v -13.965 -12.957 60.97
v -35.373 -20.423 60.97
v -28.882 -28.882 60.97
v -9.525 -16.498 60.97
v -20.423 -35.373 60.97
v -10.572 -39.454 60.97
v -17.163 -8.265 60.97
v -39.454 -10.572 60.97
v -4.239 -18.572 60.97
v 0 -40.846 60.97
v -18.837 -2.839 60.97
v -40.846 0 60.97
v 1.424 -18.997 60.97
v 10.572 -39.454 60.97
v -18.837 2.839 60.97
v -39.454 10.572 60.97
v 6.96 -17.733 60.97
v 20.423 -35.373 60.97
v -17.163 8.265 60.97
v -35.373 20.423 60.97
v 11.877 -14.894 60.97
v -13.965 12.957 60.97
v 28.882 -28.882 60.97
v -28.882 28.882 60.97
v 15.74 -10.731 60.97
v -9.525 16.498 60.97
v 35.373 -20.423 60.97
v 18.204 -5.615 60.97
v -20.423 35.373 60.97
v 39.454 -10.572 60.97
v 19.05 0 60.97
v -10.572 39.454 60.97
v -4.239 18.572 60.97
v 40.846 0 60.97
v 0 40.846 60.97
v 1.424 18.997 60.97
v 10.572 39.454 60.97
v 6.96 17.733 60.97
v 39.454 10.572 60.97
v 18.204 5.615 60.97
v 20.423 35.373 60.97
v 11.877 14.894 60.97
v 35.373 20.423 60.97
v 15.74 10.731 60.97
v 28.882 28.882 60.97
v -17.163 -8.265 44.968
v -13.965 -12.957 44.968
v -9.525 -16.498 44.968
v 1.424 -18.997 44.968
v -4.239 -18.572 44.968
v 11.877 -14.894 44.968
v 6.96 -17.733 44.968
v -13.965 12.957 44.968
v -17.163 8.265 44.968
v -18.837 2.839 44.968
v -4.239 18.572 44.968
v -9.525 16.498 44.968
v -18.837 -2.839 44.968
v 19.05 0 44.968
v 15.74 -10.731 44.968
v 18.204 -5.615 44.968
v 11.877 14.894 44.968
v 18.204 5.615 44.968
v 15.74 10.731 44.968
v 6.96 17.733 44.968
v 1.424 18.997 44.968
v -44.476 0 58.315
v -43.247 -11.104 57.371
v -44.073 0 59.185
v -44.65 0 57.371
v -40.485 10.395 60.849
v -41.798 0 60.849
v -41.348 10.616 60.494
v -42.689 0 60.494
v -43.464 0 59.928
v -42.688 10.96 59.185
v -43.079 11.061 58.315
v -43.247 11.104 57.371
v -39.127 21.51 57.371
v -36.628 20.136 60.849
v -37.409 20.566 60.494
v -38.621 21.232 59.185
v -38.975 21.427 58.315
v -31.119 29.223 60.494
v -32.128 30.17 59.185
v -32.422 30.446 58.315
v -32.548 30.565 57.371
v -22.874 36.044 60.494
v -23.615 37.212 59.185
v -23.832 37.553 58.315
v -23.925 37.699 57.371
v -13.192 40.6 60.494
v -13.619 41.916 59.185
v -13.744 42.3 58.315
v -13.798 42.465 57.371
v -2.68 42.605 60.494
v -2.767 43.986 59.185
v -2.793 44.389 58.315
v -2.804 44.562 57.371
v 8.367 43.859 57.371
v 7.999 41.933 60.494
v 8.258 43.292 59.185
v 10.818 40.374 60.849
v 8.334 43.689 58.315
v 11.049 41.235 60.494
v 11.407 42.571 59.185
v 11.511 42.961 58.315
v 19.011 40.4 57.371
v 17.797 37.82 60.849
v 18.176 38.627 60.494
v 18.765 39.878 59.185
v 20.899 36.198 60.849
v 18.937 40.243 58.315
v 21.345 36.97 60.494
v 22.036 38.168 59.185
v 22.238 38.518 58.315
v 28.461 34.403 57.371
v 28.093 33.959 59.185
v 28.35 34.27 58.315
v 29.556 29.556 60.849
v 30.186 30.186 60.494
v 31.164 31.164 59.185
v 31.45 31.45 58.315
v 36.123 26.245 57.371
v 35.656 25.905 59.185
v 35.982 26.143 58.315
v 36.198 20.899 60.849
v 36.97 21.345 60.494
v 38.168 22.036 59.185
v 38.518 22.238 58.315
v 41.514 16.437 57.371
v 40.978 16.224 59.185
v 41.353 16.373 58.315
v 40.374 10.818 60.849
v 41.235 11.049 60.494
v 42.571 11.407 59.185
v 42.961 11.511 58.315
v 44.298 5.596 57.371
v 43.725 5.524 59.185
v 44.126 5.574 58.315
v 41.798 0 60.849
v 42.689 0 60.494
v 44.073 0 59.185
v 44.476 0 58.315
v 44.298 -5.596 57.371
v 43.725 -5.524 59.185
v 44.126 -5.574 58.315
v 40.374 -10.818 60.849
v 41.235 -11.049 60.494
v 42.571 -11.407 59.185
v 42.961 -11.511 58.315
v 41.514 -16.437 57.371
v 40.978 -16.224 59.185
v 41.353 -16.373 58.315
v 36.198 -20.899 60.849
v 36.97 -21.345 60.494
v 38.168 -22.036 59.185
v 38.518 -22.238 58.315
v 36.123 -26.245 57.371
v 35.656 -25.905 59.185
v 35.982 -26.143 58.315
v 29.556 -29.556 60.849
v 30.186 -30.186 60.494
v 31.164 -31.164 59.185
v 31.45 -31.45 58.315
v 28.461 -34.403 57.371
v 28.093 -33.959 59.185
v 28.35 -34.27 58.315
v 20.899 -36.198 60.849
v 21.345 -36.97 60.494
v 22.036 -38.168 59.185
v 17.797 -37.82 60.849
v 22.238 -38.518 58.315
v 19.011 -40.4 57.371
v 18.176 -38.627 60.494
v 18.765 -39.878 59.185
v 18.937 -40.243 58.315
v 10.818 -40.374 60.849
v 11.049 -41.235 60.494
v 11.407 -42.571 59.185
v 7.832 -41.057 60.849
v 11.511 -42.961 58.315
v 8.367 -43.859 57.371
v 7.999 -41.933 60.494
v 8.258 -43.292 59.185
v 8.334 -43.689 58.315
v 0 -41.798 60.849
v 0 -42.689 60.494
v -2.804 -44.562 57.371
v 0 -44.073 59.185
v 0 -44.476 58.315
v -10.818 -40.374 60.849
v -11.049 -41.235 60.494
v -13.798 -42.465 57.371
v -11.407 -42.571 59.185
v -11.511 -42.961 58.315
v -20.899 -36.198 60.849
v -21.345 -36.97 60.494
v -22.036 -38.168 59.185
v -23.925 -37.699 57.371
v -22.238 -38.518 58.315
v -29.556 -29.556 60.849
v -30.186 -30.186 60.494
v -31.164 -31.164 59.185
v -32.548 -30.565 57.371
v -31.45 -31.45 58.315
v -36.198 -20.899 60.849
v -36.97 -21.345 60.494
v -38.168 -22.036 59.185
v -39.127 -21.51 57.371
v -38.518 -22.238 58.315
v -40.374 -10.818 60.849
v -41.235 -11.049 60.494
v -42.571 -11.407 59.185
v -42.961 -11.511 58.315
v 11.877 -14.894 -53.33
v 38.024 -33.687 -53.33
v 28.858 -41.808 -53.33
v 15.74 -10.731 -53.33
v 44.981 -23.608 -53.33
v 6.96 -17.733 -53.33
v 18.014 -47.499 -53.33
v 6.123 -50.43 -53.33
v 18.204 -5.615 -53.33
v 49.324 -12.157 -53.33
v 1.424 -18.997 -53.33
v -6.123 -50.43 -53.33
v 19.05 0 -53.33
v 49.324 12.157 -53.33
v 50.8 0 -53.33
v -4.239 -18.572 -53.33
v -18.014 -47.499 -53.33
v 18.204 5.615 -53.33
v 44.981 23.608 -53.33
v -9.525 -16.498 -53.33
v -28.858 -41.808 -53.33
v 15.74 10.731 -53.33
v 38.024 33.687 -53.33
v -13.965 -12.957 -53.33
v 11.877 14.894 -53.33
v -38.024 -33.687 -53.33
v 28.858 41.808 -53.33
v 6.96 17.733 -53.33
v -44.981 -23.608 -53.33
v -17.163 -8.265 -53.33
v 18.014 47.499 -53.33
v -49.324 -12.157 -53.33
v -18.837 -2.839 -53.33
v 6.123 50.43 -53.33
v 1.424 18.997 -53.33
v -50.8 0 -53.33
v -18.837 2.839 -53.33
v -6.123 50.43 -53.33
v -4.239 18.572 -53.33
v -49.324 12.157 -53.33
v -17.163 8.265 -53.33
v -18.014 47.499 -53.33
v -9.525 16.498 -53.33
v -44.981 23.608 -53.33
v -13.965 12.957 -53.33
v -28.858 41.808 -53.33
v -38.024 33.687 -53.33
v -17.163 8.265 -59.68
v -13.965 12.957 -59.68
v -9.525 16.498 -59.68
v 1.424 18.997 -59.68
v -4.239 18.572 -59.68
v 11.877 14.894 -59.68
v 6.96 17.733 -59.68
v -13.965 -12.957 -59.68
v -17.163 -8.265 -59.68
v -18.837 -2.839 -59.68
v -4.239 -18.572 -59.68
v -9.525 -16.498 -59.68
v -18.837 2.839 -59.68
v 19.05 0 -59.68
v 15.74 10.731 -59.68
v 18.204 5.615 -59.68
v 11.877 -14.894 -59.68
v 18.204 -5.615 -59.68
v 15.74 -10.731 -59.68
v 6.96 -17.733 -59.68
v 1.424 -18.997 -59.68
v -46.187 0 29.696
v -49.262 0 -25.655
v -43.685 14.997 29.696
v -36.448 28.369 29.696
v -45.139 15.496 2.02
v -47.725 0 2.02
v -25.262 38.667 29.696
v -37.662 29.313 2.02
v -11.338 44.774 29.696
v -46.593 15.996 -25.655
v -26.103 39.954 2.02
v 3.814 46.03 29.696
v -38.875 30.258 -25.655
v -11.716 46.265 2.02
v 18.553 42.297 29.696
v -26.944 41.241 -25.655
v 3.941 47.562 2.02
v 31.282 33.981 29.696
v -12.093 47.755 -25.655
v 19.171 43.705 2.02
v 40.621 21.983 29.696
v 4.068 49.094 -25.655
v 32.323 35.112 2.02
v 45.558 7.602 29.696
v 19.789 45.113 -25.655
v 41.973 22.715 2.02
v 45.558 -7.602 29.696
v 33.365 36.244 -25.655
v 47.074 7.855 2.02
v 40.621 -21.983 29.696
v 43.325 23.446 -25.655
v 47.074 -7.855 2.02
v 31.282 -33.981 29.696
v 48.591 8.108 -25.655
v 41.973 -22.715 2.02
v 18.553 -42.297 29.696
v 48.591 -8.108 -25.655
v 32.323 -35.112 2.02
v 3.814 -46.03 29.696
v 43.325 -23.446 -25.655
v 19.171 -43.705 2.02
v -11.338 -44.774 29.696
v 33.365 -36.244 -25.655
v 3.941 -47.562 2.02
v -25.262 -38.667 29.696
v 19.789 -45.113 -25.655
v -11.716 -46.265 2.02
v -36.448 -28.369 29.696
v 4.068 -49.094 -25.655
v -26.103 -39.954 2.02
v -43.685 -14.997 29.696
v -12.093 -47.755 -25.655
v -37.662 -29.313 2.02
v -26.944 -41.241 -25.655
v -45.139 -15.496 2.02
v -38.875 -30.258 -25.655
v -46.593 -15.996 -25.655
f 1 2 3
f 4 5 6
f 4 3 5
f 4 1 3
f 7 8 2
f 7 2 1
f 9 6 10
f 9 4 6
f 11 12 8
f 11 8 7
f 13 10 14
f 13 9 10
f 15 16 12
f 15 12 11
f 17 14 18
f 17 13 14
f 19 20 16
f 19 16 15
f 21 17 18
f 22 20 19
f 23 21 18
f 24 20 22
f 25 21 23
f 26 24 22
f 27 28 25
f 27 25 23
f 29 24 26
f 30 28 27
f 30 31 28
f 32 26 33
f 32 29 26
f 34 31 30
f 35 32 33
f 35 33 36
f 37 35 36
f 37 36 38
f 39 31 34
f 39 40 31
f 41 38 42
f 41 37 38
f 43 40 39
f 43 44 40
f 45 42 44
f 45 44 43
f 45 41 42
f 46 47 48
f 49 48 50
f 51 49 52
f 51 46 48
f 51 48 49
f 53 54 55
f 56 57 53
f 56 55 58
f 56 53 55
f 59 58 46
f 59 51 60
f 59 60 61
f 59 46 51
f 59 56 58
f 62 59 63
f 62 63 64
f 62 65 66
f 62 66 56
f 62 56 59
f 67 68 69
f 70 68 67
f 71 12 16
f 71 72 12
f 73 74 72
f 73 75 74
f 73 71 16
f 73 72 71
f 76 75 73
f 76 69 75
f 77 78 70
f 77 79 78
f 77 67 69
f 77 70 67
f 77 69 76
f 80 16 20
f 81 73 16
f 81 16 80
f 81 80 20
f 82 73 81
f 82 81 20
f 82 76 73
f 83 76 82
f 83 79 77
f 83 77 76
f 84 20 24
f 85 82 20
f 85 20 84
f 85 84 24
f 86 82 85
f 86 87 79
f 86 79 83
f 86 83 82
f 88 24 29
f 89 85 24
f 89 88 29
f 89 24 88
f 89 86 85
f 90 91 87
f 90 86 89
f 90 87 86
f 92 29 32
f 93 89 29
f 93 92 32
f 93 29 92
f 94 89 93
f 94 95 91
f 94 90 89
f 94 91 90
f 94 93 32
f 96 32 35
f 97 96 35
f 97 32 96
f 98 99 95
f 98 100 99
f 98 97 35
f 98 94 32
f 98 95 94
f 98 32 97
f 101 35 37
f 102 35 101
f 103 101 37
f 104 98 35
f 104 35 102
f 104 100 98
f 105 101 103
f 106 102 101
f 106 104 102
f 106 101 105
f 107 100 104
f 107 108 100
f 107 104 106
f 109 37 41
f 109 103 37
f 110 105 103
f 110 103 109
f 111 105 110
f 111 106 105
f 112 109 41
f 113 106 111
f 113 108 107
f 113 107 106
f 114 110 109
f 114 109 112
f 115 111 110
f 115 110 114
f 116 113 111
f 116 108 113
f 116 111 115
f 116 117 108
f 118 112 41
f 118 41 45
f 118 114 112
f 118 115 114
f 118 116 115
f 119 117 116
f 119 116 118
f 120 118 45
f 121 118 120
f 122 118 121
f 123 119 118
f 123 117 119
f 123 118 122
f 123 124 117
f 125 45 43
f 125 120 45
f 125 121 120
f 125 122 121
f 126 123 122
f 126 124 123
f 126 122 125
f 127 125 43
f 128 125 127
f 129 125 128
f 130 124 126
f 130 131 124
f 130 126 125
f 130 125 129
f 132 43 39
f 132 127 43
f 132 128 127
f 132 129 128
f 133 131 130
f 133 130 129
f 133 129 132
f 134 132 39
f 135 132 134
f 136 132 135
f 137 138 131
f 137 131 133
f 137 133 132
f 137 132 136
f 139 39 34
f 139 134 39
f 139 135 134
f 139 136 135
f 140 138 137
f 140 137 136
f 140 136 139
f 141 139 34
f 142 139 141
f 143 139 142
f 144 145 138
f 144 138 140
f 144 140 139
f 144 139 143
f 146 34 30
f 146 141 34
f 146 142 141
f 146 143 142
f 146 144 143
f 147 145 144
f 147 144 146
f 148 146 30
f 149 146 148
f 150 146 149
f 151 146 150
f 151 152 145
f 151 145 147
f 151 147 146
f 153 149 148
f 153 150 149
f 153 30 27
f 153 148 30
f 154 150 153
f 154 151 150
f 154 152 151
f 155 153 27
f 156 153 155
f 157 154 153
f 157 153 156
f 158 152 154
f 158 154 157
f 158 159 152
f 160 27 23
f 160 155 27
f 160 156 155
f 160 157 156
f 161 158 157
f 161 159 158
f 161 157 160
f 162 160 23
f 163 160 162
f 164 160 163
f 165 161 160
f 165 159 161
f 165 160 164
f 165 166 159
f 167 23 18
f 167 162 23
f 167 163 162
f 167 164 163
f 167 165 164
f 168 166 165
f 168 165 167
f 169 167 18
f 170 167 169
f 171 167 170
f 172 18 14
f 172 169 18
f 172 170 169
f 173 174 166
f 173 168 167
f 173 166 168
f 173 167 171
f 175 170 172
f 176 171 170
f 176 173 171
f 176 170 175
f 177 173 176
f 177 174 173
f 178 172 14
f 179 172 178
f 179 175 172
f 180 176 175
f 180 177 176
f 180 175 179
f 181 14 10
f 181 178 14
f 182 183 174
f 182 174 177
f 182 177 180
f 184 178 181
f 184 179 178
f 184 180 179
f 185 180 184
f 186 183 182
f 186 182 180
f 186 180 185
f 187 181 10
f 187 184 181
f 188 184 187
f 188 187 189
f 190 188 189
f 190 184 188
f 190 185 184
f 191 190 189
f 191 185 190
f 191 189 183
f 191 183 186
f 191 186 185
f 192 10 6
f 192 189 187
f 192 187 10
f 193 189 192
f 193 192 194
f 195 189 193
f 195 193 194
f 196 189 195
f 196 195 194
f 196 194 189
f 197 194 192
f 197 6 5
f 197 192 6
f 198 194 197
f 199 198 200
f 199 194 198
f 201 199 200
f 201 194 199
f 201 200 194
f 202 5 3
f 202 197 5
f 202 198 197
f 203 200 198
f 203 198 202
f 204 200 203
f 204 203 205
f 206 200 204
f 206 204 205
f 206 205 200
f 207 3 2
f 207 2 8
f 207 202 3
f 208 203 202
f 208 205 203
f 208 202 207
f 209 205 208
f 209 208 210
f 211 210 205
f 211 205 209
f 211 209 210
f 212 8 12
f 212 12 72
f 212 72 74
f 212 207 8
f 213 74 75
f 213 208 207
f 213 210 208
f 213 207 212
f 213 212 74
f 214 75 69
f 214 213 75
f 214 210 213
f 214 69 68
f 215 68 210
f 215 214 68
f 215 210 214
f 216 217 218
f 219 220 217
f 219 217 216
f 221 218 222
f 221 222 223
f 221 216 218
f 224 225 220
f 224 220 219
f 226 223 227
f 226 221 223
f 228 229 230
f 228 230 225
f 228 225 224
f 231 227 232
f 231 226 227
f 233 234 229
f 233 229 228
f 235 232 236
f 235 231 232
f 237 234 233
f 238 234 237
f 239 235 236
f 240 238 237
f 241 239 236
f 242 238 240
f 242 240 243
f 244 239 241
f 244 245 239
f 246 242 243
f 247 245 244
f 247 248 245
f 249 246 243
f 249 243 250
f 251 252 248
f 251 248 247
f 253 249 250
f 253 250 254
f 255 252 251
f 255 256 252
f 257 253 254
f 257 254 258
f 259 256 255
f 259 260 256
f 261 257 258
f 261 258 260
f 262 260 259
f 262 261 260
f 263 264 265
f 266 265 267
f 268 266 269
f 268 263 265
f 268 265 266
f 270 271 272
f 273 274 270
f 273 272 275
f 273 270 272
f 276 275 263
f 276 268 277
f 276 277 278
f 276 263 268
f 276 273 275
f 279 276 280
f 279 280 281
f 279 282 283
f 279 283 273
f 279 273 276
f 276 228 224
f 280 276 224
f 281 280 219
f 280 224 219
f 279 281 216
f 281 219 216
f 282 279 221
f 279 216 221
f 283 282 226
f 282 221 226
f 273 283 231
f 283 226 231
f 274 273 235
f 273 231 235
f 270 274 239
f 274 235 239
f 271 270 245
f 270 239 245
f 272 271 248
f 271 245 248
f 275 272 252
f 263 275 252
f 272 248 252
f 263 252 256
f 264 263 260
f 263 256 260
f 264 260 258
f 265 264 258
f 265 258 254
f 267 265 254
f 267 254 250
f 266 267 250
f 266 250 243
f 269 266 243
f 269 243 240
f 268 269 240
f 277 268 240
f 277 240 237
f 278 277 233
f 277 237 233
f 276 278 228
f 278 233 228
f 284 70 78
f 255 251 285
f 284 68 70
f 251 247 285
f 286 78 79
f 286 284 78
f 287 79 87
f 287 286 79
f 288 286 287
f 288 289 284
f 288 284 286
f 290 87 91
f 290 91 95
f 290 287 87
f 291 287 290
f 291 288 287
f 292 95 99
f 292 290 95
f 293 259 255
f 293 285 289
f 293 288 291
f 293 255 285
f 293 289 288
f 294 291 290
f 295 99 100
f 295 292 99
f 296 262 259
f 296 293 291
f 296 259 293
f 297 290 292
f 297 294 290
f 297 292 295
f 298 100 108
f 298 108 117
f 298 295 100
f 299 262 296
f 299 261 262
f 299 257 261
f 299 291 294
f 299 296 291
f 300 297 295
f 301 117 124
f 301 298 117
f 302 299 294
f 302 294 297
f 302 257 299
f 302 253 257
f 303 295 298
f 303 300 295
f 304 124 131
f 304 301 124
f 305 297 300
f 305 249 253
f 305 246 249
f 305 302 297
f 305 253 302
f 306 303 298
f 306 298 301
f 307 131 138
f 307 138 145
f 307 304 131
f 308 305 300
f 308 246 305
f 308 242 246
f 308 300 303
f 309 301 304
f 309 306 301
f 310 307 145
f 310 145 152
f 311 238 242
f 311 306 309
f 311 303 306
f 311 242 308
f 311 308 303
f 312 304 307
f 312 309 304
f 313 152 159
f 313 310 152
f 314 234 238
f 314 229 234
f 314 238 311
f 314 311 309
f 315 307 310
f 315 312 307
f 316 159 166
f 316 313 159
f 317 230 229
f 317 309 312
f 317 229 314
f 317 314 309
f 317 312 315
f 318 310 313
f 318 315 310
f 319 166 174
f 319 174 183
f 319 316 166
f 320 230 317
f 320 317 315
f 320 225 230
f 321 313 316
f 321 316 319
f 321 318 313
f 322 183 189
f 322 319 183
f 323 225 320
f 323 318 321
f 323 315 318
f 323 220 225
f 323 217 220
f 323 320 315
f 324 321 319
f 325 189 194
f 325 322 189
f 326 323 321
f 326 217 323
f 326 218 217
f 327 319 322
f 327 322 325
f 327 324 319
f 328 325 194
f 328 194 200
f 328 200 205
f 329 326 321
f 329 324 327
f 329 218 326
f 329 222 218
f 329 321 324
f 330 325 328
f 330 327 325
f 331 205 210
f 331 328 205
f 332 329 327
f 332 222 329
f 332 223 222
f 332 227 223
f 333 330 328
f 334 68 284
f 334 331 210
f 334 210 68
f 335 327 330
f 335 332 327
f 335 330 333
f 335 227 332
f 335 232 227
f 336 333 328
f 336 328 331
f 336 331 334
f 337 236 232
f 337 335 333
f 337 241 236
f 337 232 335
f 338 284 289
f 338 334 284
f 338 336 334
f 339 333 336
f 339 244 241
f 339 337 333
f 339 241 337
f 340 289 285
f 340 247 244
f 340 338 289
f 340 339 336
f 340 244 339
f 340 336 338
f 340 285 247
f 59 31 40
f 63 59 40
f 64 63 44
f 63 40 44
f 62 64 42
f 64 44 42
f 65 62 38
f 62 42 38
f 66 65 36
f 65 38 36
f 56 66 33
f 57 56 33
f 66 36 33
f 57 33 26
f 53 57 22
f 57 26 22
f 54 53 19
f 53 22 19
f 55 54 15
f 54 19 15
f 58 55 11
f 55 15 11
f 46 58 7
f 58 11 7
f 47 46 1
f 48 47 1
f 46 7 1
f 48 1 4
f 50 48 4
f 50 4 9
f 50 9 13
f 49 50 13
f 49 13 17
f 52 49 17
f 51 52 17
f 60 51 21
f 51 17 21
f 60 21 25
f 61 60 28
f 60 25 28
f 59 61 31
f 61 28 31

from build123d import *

# Parameters (mm, degrees)
F2_R     = 19.05
F3_DEPTH = 6.35
F4_R     = 19.05
F5_DEPTH = 16.002


with BuildPart() as f1:
    # F0 (on Front) → F1 (revolve)
    with BuildSketch(Plane.XZ):
        with BuildLine():
            Line((0, -53.330265), (0, 60.969735))
            Line((0, 60.969735), (-40.845792, 60.969735))
            ThreePointArc((-40.845792, 60.969735), (-43.464082, 59.927524), (-44.649926, 57.371076))
            Line((-44.649926, 57.371076), (-50.8, -53.330265))
            Line((-50.8, -53.330265), (0, -53.330265))
        make_face()
    revolve(axis=Axis((0, 0, 3.819735), (0, 0, -1)))

    # F2 (on face) → F3 (join)
    with BuildSketch(Plane(origin=(0, 0, -53.330265), x_dir=(1, 0, 0), z_dir=(0, 0, -1))):
        Circle(F2_R)
    extrude(amount=F3_DEPTH)

    # F4 (on face) → F5 (cut)
    with BuildSketch(Plane.XY.offset(60.969735)):
        Circle(F4_R)
    extrude(amount=-F5_DEPTH, mode=Mode.SUBTRACT)


solid = f1.part
